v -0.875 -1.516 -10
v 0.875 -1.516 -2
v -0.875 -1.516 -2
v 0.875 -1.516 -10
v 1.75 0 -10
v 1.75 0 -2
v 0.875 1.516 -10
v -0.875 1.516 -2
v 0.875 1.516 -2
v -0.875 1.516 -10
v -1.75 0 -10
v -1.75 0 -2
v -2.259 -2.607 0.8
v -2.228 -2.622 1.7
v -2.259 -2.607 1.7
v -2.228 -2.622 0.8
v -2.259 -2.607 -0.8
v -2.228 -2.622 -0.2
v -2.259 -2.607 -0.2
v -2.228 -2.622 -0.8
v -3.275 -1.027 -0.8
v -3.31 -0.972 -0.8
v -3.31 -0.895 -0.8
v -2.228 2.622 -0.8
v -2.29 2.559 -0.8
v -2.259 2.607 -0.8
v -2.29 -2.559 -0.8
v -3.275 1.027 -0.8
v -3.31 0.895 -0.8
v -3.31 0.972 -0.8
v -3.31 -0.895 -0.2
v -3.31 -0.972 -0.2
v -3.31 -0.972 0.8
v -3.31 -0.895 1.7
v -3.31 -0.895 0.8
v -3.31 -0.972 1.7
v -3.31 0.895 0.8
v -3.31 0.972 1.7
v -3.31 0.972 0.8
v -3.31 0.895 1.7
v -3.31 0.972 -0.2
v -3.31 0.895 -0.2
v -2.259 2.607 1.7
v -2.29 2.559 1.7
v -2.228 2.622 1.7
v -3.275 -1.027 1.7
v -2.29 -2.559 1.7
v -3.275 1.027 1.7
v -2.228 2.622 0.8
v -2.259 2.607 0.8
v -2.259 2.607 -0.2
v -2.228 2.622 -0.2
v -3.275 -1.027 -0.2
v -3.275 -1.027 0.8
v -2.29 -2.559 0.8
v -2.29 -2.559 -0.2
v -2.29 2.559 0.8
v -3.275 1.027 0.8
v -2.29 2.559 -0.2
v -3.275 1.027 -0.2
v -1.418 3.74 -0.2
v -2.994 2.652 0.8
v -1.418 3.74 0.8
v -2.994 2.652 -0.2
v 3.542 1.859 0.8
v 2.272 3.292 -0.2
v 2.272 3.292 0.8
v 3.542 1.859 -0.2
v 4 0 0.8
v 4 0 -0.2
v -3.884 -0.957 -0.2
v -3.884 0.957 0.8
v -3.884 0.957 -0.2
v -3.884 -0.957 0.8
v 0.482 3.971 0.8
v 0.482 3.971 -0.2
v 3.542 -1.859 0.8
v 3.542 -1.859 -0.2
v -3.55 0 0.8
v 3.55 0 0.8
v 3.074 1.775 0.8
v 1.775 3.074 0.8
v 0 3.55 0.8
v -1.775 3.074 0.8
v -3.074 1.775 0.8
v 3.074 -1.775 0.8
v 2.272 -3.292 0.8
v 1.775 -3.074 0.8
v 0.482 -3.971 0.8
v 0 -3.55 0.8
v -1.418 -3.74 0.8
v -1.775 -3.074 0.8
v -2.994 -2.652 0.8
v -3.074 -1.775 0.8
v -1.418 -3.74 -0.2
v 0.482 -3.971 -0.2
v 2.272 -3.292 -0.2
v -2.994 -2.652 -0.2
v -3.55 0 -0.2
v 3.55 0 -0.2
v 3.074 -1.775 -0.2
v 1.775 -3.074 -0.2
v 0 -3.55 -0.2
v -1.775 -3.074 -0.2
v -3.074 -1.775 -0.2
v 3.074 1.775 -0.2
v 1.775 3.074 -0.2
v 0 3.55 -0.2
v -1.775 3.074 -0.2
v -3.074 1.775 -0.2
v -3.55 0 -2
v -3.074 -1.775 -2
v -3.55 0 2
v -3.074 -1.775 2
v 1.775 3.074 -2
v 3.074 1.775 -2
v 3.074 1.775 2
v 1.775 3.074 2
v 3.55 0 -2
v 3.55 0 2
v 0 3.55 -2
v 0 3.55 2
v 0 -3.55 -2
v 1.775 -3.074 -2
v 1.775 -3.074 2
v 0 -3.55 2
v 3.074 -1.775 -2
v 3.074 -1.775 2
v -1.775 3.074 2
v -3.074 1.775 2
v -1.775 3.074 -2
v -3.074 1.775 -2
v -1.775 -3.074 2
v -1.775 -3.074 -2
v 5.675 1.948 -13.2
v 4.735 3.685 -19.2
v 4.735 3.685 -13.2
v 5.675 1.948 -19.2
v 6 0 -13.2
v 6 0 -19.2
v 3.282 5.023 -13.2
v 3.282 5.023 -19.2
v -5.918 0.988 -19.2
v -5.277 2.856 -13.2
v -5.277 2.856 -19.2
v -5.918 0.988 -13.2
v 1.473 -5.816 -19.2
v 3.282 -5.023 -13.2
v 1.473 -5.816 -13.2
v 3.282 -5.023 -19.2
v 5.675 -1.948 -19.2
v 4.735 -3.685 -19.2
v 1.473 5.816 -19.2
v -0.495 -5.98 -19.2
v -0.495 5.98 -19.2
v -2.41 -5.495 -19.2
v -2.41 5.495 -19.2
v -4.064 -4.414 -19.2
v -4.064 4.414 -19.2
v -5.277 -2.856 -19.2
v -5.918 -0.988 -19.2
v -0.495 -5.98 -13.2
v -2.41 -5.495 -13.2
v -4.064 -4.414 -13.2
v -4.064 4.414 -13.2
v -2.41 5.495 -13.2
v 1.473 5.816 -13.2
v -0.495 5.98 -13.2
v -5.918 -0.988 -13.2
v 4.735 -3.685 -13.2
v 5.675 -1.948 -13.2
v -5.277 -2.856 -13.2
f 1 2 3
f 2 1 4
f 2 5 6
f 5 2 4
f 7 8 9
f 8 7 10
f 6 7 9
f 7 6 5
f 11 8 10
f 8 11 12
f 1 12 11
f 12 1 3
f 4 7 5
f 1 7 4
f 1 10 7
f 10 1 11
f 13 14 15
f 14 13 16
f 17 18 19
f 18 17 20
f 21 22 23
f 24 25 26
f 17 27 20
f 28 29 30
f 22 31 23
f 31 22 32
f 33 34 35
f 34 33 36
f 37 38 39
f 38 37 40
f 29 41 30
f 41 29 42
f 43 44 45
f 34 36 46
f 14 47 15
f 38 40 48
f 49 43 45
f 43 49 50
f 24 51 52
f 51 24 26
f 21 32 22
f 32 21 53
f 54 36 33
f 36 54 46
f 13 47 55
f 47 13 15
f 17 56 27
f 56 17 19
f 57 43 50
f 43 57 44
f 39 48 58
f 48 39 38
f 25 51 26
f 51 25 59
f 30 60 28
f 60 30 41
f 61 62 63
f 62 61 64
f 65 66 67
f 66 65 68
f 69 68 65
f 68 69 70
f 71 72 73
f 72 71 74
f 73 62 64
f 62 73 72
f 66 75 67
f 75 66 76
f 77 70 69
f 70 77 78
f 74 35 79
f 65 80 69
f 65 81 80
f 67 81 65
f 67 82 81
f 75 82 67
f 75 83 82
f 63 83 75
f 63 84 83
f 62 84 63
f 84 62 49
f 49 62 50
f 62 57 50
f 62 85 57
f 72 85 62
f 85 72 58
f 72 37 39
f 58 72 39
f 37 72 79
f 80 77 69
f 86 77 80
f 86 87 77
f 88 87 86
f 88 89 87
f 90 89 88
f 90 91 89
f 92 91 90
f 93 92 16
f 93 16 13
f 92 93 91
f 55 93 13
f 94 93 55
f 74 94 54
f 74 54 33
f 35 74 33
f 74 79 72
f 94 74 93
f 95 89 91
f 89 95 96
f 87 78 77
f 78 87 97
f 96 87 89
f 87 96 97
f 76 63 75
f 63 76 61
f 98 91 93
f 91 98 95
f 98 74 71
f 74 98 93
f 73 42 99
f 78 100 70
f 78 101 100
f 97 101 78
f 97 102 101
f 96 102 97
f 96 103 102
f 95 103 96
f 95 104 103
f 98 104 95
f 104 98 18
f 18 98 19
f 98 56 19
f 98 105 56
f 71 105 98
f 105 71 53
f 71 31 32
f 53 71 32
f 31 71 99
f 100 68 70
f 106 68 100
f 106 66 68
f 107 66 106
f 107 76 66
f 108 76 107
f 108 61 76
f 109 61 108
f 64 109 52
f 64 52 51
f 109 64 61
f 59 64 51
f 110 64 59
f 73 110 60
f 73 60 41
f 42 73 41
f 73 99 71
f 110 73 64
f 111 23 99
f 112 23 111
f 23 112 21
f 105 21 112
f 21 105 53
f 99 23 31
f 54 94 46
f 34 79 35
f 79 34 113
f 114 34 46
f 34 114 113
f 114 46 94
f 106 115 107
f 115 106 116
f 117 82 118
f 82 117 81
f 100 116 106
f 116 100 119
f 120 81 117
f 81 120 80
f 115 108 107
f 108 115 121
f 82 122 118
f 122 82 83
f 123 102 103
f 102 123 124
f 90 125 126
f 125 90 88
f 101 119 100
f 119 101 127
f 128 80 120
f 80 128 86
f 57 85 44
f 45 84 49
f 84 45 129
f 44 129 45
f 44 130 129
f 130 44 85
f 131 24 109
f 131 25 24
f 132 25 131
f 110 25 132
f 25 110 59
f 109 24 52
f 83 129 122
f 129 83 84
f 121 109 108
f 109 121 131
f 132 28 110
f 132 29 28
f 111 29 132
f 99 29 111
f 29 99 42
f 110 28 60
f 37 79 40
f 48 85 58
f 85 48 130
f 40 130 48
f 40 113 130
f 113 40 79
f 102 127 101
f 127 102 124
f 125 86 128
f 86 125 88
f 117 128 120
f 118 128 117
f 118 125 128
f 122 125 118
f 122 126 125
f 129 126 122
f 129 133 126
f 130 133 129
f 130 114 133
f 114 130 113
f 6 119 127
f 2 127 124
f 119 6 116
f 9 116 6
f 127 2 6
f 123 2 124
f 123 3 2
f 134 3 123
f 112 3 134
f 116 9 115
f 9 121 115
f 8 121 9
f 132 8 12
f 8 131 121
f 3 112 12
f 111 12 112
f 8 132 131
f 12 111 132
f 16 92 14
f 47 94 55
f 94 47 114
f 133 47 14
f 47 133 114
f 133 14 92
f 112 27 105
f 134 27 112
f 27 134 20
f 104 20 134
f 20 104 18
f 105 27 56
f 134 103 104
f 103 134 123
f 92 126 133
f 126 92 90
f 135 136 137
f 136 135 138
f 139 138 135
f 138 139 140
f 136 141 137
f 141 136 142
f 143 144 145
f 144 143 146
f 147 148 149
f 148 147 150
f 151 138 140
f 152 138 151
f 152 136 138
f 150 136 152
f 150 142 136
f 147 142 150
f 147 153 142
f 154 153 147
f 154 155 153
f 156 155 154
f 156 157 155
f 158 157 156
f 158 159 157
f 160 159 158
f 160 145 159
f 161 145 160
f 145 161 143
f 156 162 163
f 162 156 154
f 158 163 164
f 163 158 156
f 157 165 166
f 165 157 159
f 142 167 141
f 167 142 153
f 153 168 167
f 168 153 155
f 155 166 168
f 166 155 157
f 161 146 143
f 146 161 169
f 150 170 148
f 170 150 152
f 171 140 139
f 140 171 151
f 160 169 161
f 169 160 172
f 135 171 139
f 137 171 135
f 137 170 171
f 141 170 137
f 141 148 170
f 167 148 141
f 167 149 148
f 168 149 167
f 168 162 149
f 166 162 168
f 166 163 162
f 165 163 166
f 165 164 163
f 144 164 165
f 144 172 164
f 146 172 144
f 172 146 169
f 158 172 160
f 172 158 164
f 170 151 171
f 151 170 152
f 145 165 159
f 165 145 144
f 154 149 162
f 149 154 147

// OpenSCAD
// Parameters
shank_diameter_mm = 3.5; //[1.75:7:0.1]
length_under_head_mm = 10; //[5:20:0.1]
head_diameter_mm = 6.9; //[3.45:13.8:0.1]
head_height_mm = 2.5; //[1.25:5:0.1]
tolerance_diameter_mm = 0; //[-0.2:0.2:0.01]
tolerance_length_mm = 0; //[-0.5:0.5:0.01]
overlap_mm = 0.8; //[0.2:2:0.1]
under_head_fillet_radius_mm = 0.6; //[0.2:1.5:0.1]
tip_chamfer_height_mm = 1.2; //[0.5:3:0.1]
spacer_height_mm = 4; //[2:12:0.1]
spacer_wall_mm = 1.8; //[0.8:3.6:0.1]
washer_thickness_mm = 1; //[0.5:2.5:0.1]
washer_outer_diameter_mm = 8; //[5:16:0.1]
buzzer_diameter_mm = 12; //[6:24:0.1]
buzzer_height_mm = 6; //[3:15:0.1]

// PCB Spacer - complete geometry
module pcb_spacer() {
  color([0.85, 0.85, 0.8]) {
    cylinder(r=((shank_diameter_mm + tolerance_diameter_mm)/2) + spacer_wall_mm, 
             h=spacer_height_mm, center=true);
  }
}

// Screw and Washer - complete geometry
module screw_and_washer() {
  color("DimGray") {
    // Screw Shank
    translate([0, 0, -(length_under_head_mm + tolerance_length_mm)/2])
      cylinder(r=(shank_diameter_mm + tolerance_diameter_mm)/2, 
               h=length_under_head_mm + tolerance_length_mm, center=true);
    
    // Pan Head
    translate([0, 0, (head_height_mm + tolerance_length_mm)/2 - overlap_mm])
      cylinder(r=(head_diameter_mm + tolerance_diameter_mm)/2, 
               h=head_height_mm + tolerance_length_mm, center=true);
    
    // Under Head Fillet
    translate([0, 0, -overlap_mm])
      rotate_extrude() 
        translate([((shank_diameter_mm + tolerance_diameter_mm)/2) + under_head_fillet_radius_mm, 0])
          circle(r=under_head_fillet_radius_mm);
    
    // Tip Chamfer
    translate([0, 0, -(length_under_head_mm + tolerance_length_mm) + tip_chamfer_height_mm/2 + overlap_mm])
      cylinder(r1=(shank_diameter_mm + tolerance_diameter_mm)/2, r2=0, 
               h=tip_chamfer_height_mm, center=true);
    
    // Washer
    translate([0, 0, -washer_thickness_mm/2 + overlap_mm])
      cylinder(r=(washer_outer_diameter_mm + tolerance_diameter_mm)/2, 
               h=washer_thickness_mm, center=true);
  }
}

// Buzzer - complete geometry
module buzzer() {
  color([0.1, 0.1, 0.6]) {
    translate([0, 0, -(length_under_head_mm + tolerance_length_mm) - spacer_height_mm - buzzer_height_mm/2 + overlap_mm])
      cylinder(r=(buzzer_diameter_mm + tolerance_diameter_mm)/2, 
               h=buzzer_height_mm, center=true);
  }
}

// Assembly
module assembly() {
  screw_and_washer();
  pcb_spacer();
  buzzer();
}

assembly();
